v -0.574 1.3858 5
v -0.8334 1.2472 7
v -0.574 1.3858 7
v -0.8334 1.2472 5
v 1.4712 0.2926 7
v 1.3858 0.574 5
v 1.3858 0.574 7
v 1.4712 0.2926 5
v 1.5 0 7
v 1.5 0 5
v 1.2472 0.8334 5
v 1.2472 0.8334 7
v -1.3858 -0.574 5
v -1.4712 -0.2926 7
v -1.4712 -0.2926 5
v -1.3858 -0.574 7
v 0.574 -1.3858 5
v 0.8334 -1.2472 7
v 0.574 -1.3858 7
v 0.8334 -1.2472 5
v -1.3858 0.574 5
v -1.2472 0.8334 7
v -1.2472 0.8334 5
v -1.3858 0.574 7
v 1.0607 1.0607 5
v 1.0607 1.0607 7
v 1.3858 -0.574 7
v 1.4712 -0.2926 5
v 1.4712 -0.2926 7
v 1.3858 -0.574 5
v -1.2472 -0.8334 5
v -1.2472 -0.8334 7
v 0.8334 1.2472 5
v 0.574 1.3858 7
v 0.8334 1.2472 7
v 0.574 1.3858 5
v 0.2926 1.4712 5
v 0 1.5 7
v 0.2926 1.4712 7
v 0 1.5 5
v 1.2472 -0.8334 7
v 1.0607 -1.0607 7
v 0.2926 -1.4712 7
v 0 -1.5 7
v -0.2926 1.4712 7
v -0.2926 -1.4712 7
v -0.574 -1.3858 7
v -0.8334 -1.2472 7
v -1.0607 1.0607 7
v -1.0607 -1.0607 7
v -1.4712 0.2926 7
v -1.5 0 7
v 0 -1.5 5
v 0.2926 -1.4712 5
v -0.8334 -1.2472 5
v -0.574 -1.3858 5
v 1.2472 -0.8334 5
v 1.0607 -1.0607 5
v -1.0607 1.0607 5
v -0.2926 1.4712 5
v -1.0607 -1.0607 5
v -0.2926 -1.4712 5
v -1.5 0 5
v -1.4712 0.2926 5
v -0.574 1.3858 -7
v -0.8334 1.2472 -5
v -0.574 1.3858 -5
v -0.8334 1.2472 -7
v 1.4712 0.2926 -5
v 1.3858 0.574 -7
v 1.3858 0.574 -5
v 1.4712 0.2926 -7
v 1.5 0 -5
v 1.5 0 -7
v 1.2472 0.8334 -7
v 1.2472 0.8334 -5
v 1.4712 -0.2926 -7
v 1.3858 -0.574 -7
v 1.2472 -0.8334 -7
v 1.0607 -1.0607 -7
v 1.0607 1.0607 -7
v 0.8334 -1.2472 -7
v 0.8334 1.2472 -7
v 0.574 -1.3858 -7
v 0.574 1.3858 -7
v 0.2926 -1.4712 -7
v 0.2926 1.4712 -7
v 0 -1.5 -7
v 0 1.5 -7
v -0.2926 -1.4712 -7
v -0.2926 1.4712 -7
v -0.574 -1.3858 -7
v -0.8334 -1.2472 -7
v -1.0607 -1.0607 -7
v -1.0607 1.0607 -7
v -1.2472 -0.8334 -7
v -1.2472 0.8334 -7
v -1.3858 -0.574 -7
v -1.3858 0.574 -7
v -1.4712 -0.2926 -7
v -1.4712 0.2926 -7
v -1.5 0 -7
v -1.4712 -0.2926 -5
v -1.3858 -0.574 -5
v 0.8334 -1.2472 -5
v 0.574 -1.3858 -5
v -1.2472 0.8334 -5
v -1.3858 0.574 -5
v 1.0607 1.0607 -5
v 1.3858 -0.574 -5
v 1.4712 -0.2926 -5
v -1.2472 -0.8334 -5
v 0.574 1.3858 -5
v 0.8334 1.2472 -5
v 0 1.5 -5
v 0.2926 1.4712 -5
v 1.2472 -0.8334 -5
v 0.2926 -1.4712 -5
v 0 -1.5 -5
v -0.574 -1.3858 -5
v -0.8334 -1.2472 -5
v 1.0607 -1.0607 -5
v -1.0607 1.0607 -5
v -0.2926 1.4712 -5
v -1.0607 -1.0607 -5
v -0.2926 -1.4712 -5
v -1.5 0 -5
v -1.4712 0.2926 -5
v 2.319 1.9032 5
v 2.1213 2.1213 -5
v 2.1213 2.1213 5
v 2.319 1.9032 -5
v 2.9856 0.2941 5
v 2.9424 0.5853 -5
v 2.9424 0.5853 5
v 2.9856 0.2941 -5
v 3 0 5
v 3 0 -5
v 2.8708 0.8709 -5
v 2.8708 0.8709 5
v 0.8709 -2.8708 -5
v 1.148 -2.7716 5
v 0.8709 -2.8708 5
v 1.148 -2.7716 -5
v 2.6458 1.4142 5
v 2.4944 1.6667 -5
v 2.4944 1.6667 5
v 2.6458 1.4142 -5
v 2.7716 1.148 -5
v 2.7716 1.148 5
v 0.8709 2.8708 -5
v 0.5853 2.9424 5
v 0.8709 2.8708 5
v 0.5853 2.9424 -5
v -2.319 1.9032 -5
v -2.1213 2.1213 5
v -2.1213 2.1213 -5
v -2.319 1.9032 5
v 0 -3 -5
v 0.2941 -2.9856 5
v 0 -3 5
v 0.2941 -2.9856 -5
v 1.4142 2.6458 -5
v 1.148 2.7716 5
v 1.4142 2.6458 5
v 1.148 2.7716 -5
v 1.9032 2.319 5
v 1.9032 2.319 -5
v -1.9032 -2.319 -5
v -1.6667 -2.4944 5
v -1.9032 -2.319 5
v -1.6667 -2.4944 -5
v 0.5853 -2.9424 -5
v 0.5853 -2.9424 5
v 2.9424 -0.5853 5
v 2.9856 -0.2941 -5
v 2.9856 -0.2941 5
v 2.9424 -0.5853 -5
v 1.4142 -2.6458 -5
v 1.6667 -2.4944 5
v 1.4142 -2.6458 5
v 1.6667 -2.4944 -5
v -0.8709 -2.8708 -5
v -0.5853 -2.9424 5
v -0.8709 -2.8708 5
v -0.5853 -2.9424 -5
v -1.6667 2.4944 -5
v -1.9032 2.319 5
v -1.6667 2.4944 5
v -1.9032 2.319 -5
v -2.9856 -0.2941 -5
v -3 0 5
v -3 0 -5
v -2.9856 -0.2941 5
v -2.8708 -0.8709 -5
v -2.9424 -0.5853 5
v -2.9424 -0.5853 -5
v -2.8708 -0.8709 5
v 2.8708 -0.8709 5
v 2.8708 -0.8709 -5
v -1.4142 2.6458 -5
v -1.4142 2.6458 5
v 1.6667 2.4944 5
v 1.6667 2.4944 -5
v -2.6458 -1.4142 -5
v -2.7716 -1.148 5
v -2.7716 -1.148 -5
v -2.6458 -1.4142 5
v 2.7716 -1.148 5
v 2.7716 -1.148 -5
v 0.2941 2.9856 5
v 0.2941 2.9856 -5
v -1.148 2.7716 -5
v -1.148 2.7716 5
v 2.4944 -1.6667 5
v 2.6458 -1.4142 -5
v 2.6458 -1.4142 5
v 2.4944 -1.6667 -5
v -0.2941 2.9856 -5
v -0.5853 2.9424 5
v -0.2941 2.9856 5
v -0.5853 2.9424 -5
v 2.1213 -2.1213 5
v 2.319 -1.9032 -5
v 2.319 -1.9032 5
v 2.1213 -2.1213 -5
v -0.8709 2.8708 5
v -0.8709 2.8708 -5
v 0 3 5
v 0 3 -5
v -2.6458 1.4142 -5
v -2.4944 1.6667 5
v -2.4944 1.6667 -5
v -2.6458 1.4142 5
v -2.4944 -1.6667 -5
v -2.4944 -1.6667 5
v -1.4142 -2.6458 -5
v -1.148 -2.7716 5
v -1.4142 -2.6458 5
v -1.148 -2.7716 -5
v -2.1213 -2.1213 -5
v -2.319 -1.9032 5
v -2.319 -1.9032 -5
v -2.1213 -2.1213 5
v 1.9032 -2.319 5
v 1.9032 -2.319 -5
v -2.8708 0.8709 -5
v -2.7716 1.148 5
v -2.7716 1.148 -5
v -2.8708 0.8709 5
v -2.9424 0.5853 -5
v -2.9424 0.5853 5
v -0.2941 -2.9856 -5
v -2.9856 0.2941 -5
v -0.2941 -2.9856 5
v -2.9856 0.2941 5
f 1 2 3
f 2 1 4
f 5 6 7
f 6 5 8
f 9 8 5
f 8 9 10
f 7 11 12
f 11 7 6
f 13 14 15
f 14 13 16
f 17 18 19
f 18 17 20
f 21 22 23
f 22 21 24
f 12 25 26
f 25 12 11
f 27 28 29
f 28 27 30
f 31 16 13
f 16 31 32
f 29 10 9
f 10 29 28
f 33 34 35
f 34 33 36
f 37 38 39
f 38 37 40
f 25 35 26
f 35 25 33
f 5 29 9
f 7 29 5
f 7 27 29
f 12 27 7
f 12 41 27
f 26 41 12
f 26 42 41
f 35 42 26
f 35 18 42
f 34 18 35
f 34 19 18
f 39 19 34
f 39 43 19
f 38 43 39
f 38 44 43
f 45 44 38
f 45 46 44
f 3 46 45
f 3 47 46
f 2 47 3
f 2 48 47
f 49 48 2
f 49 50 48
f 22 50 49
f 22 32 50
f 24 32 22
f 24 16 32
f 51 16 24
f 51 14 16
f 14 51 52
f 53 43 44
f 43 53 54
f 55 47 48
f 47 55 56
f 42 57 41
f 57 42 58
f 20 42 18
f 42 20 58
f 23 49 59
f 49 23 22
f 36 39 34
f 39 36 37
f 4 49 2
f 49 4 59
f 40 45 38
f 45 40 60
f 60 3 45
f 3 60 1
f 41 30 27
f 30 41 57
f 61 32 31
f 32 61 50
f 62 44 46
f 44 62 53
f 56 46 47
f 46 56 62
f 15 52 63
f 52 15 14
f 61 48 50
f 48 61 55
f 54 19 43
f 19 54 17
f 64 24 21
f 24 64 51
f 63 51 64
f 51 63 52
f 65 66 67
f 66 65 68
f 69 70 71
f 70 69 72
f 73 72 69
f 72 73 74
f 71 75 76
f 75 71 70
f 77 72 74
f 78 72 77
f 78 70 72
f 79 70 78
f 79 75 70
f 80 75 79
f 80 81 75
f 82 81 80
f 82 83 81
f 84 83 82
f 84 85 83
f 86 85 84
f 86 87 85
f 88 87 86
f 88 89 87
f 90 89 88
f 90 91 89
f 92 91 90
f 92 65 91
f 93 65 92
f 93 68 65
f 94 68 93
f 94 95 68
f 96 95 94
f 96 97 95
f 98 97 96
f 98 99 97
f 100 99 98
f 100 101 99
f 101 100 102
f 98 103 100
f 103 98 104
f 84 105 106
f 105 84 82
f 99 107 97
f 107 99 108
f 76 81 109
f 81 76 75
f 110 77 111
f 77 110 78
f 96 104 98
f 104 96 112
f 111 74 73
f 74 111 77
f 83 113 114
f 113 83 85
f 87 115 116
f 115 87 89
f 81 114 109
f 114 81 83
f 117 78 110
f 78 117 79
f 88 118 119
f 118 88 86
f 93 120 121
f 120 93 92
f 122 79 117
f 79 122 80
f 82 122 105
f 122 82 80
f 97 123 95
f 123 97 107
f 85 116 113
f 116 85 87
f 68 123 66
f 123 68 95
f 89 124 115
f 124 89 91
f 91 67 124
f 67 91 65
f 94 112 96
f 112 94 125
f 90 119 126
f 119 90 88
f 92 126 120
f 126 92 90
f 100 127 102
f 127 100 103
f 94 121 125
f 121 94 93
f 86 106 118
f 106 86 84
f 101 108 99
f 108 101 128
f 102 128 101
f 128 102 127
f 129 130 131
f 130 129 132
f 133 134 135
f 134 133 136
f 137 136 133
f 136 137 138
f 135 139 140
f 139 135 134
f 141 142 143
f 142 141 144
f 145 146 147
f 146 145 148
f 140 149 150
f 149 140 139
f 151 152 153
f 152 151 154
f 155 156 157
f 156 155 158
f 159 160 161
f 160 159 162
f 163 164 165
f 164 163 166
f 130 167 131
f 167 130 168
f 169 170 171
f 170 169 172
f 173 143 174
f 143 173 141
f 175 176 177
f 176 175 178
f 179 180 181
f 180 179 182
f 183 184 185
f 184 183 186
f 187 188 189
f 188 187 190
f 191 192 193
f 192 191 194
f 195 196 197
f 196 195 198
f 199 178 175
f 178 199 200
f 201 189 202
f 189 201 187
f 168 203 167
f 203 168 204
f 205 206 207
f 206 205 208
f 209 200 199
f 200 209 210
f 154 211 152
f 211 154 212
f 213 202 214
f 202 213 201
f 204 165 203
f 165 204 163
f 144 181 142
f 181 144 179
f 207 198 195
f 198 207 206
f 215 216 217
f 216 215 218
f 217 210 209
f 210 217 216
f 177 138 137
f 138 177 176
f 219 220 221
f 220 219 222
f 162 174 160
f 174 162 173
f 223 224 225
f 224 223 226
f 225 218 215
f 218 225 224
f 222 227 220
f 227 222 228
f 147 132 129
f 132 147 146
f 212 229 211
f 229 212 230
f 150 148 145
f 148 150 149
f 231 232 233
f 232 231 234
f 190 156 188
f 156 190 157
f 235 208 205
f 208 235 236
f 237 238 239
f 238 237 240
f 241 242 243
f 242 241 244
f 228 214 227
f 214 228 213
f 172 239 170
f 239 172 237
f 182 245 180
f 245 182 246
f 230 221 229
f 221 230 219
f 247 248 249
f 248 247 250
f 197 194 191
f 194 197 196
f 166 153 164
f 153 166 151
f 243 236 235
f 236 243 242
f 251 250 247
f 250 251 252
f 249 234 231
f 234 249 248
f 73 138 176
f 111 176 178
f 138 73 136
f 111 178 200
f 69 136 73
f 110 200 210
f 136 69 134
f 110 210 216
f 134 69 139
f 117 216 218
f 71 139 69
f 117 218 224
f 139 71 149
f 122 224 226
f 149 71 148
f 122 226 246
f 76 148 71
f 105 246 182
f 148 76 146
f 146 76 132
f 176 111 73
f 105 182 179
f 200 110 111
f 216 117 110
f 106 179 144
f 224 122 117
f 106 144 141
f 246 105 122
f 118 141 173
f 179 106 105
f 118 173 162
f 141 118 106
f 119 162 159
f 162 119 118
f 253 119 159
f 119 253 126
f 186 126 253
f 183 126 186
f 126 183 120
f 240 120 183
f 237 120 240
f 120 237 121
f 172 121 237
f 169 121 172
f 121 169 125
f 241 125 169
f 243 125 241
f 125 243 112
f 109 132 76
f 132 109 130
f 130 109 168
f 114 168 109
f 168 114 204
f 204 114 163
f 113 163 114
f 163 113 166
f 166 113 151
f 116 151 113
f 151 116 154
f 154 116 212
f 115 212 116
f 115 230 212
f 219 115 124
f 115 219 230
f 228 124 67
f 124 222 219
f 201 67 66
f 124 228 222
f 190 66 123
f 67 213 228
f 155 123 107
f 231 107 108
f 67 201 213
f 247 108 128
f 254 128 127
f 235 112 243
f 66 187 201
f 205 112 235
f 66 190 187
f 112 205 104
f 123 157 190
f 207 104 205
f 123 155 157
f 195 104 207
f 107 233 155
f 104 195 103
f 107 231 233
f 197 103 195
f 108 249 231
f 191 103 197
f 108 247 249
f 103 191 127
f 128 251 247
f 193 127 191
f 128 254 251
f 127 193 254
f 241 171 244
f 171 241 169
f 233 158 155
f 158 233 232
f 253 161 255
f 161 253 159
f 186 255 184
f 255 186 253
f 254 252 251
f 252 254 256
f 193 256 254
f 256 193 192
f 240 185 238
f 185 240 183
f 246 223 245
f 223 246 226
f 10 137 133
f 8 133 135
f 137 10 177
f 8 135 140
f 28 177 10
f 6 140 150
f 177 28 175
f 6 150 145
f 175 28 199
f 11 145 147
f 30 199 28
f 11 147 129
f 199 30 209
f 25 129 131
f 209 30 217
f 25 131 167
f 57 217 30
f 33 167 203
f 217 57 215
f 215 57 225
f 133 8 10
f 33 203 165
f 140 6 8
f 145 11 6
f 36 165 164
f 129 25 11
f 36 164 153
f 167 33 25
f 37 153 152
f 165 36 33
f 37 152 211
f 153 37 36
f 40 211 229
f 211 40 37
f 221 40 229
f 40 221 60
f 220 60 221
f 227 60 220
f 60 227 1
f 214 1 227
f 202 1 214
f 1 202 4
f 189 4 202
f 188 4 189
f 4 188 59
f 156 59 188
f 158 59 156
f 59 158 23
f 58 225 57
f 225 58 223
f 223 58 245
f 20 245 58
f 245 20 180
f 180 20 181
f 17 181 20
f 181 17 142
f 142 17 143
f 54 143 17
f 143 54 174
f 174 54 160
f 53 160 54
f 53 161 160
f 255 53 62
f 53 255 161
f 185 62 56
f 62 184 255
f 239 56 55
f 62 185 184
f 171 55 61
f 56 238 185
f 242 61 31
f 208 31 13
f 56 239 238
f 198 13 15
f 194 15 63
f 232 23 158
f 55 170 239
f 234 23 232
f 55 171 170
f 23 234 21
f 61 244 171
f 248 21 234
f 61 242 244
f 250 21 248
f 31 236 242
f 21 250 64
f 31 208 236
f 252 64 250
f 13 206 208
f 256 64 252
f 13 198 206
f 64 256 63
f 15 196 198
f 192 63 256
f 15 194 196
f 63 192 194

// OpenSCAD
// Parameters
thread_diameter_mm = 3.0; //[1.5:6.0:0.1]
length_mm = 10.0; //[5.0:20.0:0.5]
outer_diameter_mm = 6.0; //[3.5:12.0:0.5]
thread_length_top_mm = 3.0; //[0.0:10.0:0.5]
thread_length_bottom_mm = 3.0; //[0.0:10.0:0.5]
overlap_mm = 1.0; //[0.5:2.0:0.1]

// Standoff - complete geometry
module standoff() {
  color("Silver") {
    // Pillar body
    translate([0, 0, 0])
      cylinder(h=length_mm, r=outer_diameter_mm/2, center=true, $fn=64);
  }
}

// Pillar - complete geometry
module pillar() {
  color("DimGray") {
    // Top threaded interface
    translate([0, 0, length_mm/2 + thread_length_top_mm/2 - overlap_mm])
      cylinder(h=thread_length_top_mm, r=thread_diameter_mm/2, center=true, $fn=32);
    
    // Bottom threaded interface
    translate([0, 0, -(length_mm/2 + thread_length_bottom_mm/2 - overlap_mm)])
      cylinder(h=thread_length_bottom_mm, r=thread_diameter_mm/2, center=true, $fn=32);
  }
}

// Assembly
module assembly() {
  standoff();
  pillar();
}

assembly();
